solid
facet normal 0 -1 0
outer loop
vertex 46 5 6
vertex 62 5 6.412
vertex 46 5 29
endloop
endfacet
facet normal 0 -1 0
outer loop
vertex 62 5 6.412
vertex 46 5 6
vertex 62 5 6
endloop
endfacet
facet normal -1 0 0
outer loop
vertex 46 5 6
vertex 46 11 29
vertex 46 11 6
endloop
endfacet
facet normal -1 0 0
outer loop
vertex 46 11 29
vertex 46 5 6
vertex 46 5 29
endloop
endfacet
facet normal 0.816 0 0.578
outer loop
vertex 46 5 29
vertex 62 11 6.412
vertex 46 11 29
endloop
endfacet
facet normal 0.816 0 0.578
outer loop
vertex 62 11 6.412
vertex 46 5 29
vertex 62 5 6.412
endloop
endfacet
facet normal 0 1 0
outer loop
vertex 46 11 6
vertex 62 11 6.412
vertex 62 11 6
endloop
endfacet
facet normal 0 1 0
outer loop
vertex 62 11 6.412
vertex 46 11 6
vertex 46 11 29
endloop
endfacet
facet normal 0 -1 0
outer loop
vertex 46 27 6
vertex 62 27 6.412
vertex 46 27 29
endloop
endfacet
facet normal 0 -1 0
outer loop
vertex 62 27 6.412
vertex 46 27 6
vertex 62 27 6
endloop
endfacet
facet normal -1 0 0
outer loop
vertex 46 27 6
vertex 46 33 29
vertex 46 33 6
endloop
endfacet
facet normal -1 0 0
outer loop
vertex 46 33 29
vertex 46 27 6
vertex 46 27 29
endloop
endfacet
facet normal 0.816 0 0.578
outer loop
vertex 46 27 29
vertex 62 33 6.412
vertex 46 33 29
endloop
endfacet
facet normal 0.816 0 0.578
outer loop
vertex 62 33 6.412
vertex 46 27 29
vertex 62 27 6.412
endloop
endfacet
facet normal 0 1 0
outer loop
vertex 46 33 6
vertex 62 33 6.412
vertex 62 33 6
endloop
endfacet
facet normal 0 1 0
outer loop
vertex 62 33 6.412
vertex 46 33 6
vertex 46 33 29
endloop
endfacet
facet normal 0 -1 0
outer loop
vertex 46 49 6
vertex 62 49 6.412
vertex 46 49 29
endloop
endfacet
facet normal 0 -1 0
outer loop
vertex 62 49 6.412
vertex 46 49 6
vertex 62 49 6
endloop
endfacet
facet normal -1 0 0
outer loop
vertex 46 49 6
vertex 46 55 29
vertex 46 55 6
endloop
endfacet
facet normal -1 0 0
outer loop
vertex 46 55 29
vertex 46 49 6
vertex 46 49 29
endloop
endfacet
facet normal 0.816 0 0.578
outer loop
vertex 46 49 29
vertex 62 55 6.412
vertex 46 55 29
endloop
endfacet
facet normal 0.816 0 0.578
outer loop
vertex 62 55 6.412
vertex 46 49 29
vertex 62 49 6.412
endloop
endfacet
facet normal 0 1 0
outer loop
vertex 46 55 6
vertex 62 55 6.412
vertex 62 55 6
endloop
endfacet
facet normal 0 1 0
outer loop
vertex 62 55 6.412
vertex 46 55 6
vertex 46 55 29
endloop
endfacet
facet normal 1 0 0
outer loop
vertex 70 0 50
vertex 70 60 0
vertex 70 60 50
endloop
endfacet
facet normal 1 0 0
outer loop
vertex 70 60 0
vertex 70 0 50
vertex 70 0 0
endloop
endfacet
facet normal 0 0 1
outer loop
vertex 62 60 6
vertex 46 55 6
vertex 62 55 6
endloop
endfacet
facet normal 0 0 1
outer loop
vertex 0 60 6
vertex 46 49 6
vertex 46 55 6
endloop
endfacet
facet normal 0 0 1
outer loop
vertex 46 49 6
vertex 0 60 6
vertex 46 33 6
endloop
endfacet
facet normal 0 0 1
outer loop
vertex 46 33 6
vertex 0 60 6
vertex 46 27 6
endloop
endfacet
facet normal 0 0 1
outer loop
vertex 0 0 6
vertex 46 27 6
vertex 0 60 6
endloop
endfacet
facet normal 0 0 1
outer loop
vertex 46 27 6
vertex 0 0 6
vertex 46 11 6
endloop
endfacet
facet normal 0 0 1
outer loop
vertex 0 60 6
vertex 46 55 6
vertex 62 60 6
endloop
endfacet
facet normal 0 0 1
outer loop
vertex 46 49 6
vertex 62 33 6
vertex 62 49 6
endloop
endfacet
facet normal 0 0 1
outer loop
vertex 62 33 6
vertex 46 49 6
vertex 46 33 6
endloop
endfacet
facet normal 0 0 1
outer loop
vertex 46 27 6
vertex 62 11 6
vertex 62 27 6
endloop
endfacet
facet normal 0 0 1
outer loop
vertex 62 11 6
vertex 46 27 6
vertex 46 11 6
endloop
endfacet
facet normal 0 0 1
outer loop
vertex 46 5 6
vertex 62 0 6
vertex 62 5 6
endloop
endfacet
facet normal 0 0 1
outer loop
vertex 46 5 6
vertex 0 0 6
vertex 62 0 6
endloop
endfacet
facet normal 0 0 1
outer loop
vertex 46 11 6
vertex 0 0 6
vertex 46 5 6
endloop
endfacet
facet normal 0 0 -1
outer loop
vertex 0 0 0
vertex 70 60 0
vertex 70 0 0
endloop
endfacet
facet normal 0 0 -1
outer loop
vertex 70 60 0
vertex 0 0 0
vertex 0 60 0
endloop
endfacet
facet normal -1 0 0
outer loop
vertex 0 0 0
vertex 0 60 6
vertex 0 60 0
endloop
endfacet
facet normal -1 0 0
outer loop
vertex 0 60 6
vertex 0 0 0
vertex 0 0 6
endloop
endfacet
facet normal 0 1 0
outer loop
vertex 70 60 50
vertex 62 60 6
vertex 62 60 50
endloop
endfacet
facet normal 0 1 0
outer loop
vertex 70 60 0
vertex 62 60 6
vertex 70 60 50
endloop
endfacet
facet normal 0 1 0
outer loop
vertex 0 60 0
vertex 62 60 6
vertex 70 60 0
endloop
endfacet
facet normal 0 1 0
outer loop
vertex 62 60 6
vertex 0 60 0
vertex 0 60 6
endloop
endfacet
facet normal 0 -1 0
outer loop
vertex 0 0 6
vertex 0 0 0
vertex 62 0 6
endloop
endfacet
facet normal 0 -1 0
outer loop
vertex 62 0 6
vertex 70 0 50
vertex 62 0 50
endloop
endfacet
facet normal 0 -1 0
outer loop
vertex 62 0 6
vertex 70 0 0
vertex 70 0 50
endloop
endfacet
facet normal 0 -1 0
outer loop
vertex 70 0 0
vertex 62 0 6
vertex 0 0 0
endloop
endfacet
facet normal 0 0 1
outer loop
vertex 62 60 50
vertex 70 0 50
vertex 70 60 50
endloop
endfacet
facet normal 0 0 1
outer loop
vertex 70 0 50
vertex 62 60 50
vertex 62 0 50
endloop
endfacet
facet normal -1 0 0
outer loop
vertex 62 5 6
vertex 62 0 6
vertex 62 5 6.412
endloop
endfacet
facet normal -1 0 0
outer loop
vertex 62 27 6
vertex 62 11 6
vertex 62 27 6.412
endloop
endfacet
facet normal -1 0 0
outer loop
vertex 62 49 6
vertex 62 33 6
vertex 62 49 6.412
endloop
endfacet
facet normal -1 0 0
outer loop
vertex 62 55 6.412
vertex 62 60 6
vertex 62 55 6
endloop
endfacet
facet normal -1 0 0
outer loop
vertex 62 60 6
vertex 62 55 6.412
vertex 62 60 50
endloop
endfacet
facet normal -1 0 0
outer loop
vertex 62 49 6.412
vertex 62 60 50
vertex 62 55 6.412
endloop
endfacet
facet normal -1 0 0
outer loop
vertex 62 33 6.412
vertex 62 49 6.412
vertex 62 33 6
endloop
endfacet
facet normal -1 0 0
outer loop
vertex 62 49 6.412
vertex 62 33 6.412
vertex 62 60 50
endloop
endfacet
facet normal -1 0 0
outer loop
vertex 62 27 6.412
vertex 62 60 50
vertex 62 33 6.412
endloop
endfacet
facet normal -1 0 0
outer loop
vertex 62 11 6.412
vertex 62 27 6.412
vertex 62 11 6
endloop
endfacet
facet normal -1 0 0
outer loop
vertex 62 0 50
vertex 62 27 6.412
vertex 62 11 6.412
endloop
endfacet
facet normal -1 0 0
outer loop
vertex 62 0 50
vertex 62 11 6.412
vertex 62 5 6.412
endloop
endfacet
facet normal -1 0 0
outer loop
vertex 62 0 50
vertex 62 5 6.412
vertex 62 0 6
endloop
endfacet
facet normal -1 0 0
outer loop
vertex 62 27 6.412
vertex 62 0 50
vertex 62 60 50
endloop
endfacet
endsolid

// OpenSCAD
$fn = 32;

// ----------------------------------------------------------------------
// Rib bracket: 3-gusset L bracket
// ----------------------------------------------------------------------

// --- parameters (mm) ---
base_l = 70;              // foot length, X
base_w = 60;              // foot width, Y
base_t = 6;               // foot thickness
plate_t = 8;              // upright plate thickness
plate_h = 50;             // overall height
gus_l = 16;               // gusset leg along the foot
gus_h = 24;               // gusset height
gus_t = 6;                // gusset thickness
gus_edge = 5;             // gusset margin from the foot edge
n_gus = 3;                // gusset count

gus_pitch = (base_w - 2 * gus_edge - gus_t) / (n_gus - 1);  // gusset pitch

union() {
  cube([base_l, base_w, base_t]);
  translate([base_l - plate_t, 0, base_t - 1])
    cube([plate_t, base_w, plate_h - base_t + 1]);
  for (i = [0 : n_gus - 1])
    translate([base_l - plate_t - gus_l, gus_edge + i * gus_pitch, base_t - 1])
      rotate([-90, 0, 0])
        linear_extrude(height = gus_t)
          polygon(points = [[0, 0], [gus_l + 1, 0], [0, -gus_h]]);
}
